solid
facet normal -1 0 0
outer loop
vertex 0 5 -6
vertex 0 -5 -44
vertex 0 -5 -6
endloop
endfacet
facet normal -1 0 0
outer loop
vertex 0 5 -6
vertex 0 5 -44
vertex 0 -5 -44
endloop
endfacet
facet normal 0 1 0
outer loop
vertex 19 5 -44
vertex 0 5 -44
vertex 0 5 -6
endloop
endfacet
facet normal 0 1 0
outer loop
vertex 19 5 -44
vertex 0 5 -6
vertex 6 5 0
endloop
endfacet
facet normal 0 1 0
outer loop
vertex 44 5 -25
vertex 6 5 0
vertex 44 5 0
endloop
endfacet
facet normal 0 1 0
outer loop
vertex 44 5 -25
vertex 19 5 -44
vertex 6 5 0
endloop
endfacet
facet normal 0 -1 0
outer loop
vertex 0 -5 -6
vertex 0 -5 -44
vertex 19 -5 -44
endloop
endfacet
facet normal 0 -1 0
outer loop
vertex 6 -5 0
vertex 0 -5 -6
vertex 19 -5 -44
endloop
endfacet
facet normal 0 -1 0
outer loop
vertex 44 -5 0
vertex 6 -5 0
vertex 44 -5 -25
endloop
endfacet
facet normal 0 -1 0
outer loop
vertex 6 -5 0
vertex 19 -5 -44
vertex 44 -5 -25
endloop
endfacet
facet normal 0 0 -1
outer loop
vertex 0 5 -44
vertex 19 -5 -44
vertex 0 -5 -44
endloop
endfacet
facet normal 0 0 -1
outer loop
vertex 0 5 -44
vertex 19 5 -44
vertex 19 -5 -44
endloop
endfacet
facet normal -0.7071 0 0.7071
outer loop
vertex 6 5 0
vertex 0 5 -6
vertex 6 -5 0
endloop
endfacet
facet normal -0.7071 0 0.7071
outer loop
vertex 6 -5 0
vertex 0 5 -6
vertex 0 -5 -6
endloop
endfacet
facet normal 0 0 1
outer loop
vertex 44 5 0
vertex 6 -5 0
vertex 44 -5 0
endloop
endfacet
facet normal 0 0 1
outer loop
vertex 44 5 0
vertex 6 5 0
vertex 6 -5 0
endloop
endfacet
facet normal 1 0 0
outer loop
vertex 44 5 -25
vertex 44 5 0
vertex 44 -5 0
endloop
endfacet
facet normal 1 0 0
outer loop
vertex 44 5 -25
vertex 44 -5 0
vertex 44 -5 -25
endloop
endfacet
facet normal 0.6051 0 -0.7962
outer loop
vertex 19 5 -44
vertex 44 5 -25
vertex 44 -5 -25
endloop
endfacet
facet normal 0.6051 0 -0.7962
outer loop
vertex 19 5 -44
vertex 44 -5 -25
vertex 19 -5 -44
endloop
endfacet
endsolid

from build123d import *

# Parameters (mm, degrees)
BASE_EXTRUDE_DEPTH = 5
CHAMFER1_SIZE      = 6


with BuildPart() as part:
    # Sketch1 → Base-Extrude (new, symmetric)
    with BuildSketch(Plane(origin=(0, 0, 0), x_dir=(1, 0, 0), z_dir=(0, 1, 0))):
        Polygon((0, 0), (44, 0), (44, 25), (19, 44), (0, 44), align=None)
    extrude(amount=BASE_EXTRUDE_DEPTH, both=True)

    # Chamfer1
    chamfer1_edges = [part.edges().sort_by_distance(p)[0] for p in [
        (0, 0, 0),
    ]]
    chamfer(chamfer1_edges, length=CHAMFER1_SIZE)


solid = part.part
